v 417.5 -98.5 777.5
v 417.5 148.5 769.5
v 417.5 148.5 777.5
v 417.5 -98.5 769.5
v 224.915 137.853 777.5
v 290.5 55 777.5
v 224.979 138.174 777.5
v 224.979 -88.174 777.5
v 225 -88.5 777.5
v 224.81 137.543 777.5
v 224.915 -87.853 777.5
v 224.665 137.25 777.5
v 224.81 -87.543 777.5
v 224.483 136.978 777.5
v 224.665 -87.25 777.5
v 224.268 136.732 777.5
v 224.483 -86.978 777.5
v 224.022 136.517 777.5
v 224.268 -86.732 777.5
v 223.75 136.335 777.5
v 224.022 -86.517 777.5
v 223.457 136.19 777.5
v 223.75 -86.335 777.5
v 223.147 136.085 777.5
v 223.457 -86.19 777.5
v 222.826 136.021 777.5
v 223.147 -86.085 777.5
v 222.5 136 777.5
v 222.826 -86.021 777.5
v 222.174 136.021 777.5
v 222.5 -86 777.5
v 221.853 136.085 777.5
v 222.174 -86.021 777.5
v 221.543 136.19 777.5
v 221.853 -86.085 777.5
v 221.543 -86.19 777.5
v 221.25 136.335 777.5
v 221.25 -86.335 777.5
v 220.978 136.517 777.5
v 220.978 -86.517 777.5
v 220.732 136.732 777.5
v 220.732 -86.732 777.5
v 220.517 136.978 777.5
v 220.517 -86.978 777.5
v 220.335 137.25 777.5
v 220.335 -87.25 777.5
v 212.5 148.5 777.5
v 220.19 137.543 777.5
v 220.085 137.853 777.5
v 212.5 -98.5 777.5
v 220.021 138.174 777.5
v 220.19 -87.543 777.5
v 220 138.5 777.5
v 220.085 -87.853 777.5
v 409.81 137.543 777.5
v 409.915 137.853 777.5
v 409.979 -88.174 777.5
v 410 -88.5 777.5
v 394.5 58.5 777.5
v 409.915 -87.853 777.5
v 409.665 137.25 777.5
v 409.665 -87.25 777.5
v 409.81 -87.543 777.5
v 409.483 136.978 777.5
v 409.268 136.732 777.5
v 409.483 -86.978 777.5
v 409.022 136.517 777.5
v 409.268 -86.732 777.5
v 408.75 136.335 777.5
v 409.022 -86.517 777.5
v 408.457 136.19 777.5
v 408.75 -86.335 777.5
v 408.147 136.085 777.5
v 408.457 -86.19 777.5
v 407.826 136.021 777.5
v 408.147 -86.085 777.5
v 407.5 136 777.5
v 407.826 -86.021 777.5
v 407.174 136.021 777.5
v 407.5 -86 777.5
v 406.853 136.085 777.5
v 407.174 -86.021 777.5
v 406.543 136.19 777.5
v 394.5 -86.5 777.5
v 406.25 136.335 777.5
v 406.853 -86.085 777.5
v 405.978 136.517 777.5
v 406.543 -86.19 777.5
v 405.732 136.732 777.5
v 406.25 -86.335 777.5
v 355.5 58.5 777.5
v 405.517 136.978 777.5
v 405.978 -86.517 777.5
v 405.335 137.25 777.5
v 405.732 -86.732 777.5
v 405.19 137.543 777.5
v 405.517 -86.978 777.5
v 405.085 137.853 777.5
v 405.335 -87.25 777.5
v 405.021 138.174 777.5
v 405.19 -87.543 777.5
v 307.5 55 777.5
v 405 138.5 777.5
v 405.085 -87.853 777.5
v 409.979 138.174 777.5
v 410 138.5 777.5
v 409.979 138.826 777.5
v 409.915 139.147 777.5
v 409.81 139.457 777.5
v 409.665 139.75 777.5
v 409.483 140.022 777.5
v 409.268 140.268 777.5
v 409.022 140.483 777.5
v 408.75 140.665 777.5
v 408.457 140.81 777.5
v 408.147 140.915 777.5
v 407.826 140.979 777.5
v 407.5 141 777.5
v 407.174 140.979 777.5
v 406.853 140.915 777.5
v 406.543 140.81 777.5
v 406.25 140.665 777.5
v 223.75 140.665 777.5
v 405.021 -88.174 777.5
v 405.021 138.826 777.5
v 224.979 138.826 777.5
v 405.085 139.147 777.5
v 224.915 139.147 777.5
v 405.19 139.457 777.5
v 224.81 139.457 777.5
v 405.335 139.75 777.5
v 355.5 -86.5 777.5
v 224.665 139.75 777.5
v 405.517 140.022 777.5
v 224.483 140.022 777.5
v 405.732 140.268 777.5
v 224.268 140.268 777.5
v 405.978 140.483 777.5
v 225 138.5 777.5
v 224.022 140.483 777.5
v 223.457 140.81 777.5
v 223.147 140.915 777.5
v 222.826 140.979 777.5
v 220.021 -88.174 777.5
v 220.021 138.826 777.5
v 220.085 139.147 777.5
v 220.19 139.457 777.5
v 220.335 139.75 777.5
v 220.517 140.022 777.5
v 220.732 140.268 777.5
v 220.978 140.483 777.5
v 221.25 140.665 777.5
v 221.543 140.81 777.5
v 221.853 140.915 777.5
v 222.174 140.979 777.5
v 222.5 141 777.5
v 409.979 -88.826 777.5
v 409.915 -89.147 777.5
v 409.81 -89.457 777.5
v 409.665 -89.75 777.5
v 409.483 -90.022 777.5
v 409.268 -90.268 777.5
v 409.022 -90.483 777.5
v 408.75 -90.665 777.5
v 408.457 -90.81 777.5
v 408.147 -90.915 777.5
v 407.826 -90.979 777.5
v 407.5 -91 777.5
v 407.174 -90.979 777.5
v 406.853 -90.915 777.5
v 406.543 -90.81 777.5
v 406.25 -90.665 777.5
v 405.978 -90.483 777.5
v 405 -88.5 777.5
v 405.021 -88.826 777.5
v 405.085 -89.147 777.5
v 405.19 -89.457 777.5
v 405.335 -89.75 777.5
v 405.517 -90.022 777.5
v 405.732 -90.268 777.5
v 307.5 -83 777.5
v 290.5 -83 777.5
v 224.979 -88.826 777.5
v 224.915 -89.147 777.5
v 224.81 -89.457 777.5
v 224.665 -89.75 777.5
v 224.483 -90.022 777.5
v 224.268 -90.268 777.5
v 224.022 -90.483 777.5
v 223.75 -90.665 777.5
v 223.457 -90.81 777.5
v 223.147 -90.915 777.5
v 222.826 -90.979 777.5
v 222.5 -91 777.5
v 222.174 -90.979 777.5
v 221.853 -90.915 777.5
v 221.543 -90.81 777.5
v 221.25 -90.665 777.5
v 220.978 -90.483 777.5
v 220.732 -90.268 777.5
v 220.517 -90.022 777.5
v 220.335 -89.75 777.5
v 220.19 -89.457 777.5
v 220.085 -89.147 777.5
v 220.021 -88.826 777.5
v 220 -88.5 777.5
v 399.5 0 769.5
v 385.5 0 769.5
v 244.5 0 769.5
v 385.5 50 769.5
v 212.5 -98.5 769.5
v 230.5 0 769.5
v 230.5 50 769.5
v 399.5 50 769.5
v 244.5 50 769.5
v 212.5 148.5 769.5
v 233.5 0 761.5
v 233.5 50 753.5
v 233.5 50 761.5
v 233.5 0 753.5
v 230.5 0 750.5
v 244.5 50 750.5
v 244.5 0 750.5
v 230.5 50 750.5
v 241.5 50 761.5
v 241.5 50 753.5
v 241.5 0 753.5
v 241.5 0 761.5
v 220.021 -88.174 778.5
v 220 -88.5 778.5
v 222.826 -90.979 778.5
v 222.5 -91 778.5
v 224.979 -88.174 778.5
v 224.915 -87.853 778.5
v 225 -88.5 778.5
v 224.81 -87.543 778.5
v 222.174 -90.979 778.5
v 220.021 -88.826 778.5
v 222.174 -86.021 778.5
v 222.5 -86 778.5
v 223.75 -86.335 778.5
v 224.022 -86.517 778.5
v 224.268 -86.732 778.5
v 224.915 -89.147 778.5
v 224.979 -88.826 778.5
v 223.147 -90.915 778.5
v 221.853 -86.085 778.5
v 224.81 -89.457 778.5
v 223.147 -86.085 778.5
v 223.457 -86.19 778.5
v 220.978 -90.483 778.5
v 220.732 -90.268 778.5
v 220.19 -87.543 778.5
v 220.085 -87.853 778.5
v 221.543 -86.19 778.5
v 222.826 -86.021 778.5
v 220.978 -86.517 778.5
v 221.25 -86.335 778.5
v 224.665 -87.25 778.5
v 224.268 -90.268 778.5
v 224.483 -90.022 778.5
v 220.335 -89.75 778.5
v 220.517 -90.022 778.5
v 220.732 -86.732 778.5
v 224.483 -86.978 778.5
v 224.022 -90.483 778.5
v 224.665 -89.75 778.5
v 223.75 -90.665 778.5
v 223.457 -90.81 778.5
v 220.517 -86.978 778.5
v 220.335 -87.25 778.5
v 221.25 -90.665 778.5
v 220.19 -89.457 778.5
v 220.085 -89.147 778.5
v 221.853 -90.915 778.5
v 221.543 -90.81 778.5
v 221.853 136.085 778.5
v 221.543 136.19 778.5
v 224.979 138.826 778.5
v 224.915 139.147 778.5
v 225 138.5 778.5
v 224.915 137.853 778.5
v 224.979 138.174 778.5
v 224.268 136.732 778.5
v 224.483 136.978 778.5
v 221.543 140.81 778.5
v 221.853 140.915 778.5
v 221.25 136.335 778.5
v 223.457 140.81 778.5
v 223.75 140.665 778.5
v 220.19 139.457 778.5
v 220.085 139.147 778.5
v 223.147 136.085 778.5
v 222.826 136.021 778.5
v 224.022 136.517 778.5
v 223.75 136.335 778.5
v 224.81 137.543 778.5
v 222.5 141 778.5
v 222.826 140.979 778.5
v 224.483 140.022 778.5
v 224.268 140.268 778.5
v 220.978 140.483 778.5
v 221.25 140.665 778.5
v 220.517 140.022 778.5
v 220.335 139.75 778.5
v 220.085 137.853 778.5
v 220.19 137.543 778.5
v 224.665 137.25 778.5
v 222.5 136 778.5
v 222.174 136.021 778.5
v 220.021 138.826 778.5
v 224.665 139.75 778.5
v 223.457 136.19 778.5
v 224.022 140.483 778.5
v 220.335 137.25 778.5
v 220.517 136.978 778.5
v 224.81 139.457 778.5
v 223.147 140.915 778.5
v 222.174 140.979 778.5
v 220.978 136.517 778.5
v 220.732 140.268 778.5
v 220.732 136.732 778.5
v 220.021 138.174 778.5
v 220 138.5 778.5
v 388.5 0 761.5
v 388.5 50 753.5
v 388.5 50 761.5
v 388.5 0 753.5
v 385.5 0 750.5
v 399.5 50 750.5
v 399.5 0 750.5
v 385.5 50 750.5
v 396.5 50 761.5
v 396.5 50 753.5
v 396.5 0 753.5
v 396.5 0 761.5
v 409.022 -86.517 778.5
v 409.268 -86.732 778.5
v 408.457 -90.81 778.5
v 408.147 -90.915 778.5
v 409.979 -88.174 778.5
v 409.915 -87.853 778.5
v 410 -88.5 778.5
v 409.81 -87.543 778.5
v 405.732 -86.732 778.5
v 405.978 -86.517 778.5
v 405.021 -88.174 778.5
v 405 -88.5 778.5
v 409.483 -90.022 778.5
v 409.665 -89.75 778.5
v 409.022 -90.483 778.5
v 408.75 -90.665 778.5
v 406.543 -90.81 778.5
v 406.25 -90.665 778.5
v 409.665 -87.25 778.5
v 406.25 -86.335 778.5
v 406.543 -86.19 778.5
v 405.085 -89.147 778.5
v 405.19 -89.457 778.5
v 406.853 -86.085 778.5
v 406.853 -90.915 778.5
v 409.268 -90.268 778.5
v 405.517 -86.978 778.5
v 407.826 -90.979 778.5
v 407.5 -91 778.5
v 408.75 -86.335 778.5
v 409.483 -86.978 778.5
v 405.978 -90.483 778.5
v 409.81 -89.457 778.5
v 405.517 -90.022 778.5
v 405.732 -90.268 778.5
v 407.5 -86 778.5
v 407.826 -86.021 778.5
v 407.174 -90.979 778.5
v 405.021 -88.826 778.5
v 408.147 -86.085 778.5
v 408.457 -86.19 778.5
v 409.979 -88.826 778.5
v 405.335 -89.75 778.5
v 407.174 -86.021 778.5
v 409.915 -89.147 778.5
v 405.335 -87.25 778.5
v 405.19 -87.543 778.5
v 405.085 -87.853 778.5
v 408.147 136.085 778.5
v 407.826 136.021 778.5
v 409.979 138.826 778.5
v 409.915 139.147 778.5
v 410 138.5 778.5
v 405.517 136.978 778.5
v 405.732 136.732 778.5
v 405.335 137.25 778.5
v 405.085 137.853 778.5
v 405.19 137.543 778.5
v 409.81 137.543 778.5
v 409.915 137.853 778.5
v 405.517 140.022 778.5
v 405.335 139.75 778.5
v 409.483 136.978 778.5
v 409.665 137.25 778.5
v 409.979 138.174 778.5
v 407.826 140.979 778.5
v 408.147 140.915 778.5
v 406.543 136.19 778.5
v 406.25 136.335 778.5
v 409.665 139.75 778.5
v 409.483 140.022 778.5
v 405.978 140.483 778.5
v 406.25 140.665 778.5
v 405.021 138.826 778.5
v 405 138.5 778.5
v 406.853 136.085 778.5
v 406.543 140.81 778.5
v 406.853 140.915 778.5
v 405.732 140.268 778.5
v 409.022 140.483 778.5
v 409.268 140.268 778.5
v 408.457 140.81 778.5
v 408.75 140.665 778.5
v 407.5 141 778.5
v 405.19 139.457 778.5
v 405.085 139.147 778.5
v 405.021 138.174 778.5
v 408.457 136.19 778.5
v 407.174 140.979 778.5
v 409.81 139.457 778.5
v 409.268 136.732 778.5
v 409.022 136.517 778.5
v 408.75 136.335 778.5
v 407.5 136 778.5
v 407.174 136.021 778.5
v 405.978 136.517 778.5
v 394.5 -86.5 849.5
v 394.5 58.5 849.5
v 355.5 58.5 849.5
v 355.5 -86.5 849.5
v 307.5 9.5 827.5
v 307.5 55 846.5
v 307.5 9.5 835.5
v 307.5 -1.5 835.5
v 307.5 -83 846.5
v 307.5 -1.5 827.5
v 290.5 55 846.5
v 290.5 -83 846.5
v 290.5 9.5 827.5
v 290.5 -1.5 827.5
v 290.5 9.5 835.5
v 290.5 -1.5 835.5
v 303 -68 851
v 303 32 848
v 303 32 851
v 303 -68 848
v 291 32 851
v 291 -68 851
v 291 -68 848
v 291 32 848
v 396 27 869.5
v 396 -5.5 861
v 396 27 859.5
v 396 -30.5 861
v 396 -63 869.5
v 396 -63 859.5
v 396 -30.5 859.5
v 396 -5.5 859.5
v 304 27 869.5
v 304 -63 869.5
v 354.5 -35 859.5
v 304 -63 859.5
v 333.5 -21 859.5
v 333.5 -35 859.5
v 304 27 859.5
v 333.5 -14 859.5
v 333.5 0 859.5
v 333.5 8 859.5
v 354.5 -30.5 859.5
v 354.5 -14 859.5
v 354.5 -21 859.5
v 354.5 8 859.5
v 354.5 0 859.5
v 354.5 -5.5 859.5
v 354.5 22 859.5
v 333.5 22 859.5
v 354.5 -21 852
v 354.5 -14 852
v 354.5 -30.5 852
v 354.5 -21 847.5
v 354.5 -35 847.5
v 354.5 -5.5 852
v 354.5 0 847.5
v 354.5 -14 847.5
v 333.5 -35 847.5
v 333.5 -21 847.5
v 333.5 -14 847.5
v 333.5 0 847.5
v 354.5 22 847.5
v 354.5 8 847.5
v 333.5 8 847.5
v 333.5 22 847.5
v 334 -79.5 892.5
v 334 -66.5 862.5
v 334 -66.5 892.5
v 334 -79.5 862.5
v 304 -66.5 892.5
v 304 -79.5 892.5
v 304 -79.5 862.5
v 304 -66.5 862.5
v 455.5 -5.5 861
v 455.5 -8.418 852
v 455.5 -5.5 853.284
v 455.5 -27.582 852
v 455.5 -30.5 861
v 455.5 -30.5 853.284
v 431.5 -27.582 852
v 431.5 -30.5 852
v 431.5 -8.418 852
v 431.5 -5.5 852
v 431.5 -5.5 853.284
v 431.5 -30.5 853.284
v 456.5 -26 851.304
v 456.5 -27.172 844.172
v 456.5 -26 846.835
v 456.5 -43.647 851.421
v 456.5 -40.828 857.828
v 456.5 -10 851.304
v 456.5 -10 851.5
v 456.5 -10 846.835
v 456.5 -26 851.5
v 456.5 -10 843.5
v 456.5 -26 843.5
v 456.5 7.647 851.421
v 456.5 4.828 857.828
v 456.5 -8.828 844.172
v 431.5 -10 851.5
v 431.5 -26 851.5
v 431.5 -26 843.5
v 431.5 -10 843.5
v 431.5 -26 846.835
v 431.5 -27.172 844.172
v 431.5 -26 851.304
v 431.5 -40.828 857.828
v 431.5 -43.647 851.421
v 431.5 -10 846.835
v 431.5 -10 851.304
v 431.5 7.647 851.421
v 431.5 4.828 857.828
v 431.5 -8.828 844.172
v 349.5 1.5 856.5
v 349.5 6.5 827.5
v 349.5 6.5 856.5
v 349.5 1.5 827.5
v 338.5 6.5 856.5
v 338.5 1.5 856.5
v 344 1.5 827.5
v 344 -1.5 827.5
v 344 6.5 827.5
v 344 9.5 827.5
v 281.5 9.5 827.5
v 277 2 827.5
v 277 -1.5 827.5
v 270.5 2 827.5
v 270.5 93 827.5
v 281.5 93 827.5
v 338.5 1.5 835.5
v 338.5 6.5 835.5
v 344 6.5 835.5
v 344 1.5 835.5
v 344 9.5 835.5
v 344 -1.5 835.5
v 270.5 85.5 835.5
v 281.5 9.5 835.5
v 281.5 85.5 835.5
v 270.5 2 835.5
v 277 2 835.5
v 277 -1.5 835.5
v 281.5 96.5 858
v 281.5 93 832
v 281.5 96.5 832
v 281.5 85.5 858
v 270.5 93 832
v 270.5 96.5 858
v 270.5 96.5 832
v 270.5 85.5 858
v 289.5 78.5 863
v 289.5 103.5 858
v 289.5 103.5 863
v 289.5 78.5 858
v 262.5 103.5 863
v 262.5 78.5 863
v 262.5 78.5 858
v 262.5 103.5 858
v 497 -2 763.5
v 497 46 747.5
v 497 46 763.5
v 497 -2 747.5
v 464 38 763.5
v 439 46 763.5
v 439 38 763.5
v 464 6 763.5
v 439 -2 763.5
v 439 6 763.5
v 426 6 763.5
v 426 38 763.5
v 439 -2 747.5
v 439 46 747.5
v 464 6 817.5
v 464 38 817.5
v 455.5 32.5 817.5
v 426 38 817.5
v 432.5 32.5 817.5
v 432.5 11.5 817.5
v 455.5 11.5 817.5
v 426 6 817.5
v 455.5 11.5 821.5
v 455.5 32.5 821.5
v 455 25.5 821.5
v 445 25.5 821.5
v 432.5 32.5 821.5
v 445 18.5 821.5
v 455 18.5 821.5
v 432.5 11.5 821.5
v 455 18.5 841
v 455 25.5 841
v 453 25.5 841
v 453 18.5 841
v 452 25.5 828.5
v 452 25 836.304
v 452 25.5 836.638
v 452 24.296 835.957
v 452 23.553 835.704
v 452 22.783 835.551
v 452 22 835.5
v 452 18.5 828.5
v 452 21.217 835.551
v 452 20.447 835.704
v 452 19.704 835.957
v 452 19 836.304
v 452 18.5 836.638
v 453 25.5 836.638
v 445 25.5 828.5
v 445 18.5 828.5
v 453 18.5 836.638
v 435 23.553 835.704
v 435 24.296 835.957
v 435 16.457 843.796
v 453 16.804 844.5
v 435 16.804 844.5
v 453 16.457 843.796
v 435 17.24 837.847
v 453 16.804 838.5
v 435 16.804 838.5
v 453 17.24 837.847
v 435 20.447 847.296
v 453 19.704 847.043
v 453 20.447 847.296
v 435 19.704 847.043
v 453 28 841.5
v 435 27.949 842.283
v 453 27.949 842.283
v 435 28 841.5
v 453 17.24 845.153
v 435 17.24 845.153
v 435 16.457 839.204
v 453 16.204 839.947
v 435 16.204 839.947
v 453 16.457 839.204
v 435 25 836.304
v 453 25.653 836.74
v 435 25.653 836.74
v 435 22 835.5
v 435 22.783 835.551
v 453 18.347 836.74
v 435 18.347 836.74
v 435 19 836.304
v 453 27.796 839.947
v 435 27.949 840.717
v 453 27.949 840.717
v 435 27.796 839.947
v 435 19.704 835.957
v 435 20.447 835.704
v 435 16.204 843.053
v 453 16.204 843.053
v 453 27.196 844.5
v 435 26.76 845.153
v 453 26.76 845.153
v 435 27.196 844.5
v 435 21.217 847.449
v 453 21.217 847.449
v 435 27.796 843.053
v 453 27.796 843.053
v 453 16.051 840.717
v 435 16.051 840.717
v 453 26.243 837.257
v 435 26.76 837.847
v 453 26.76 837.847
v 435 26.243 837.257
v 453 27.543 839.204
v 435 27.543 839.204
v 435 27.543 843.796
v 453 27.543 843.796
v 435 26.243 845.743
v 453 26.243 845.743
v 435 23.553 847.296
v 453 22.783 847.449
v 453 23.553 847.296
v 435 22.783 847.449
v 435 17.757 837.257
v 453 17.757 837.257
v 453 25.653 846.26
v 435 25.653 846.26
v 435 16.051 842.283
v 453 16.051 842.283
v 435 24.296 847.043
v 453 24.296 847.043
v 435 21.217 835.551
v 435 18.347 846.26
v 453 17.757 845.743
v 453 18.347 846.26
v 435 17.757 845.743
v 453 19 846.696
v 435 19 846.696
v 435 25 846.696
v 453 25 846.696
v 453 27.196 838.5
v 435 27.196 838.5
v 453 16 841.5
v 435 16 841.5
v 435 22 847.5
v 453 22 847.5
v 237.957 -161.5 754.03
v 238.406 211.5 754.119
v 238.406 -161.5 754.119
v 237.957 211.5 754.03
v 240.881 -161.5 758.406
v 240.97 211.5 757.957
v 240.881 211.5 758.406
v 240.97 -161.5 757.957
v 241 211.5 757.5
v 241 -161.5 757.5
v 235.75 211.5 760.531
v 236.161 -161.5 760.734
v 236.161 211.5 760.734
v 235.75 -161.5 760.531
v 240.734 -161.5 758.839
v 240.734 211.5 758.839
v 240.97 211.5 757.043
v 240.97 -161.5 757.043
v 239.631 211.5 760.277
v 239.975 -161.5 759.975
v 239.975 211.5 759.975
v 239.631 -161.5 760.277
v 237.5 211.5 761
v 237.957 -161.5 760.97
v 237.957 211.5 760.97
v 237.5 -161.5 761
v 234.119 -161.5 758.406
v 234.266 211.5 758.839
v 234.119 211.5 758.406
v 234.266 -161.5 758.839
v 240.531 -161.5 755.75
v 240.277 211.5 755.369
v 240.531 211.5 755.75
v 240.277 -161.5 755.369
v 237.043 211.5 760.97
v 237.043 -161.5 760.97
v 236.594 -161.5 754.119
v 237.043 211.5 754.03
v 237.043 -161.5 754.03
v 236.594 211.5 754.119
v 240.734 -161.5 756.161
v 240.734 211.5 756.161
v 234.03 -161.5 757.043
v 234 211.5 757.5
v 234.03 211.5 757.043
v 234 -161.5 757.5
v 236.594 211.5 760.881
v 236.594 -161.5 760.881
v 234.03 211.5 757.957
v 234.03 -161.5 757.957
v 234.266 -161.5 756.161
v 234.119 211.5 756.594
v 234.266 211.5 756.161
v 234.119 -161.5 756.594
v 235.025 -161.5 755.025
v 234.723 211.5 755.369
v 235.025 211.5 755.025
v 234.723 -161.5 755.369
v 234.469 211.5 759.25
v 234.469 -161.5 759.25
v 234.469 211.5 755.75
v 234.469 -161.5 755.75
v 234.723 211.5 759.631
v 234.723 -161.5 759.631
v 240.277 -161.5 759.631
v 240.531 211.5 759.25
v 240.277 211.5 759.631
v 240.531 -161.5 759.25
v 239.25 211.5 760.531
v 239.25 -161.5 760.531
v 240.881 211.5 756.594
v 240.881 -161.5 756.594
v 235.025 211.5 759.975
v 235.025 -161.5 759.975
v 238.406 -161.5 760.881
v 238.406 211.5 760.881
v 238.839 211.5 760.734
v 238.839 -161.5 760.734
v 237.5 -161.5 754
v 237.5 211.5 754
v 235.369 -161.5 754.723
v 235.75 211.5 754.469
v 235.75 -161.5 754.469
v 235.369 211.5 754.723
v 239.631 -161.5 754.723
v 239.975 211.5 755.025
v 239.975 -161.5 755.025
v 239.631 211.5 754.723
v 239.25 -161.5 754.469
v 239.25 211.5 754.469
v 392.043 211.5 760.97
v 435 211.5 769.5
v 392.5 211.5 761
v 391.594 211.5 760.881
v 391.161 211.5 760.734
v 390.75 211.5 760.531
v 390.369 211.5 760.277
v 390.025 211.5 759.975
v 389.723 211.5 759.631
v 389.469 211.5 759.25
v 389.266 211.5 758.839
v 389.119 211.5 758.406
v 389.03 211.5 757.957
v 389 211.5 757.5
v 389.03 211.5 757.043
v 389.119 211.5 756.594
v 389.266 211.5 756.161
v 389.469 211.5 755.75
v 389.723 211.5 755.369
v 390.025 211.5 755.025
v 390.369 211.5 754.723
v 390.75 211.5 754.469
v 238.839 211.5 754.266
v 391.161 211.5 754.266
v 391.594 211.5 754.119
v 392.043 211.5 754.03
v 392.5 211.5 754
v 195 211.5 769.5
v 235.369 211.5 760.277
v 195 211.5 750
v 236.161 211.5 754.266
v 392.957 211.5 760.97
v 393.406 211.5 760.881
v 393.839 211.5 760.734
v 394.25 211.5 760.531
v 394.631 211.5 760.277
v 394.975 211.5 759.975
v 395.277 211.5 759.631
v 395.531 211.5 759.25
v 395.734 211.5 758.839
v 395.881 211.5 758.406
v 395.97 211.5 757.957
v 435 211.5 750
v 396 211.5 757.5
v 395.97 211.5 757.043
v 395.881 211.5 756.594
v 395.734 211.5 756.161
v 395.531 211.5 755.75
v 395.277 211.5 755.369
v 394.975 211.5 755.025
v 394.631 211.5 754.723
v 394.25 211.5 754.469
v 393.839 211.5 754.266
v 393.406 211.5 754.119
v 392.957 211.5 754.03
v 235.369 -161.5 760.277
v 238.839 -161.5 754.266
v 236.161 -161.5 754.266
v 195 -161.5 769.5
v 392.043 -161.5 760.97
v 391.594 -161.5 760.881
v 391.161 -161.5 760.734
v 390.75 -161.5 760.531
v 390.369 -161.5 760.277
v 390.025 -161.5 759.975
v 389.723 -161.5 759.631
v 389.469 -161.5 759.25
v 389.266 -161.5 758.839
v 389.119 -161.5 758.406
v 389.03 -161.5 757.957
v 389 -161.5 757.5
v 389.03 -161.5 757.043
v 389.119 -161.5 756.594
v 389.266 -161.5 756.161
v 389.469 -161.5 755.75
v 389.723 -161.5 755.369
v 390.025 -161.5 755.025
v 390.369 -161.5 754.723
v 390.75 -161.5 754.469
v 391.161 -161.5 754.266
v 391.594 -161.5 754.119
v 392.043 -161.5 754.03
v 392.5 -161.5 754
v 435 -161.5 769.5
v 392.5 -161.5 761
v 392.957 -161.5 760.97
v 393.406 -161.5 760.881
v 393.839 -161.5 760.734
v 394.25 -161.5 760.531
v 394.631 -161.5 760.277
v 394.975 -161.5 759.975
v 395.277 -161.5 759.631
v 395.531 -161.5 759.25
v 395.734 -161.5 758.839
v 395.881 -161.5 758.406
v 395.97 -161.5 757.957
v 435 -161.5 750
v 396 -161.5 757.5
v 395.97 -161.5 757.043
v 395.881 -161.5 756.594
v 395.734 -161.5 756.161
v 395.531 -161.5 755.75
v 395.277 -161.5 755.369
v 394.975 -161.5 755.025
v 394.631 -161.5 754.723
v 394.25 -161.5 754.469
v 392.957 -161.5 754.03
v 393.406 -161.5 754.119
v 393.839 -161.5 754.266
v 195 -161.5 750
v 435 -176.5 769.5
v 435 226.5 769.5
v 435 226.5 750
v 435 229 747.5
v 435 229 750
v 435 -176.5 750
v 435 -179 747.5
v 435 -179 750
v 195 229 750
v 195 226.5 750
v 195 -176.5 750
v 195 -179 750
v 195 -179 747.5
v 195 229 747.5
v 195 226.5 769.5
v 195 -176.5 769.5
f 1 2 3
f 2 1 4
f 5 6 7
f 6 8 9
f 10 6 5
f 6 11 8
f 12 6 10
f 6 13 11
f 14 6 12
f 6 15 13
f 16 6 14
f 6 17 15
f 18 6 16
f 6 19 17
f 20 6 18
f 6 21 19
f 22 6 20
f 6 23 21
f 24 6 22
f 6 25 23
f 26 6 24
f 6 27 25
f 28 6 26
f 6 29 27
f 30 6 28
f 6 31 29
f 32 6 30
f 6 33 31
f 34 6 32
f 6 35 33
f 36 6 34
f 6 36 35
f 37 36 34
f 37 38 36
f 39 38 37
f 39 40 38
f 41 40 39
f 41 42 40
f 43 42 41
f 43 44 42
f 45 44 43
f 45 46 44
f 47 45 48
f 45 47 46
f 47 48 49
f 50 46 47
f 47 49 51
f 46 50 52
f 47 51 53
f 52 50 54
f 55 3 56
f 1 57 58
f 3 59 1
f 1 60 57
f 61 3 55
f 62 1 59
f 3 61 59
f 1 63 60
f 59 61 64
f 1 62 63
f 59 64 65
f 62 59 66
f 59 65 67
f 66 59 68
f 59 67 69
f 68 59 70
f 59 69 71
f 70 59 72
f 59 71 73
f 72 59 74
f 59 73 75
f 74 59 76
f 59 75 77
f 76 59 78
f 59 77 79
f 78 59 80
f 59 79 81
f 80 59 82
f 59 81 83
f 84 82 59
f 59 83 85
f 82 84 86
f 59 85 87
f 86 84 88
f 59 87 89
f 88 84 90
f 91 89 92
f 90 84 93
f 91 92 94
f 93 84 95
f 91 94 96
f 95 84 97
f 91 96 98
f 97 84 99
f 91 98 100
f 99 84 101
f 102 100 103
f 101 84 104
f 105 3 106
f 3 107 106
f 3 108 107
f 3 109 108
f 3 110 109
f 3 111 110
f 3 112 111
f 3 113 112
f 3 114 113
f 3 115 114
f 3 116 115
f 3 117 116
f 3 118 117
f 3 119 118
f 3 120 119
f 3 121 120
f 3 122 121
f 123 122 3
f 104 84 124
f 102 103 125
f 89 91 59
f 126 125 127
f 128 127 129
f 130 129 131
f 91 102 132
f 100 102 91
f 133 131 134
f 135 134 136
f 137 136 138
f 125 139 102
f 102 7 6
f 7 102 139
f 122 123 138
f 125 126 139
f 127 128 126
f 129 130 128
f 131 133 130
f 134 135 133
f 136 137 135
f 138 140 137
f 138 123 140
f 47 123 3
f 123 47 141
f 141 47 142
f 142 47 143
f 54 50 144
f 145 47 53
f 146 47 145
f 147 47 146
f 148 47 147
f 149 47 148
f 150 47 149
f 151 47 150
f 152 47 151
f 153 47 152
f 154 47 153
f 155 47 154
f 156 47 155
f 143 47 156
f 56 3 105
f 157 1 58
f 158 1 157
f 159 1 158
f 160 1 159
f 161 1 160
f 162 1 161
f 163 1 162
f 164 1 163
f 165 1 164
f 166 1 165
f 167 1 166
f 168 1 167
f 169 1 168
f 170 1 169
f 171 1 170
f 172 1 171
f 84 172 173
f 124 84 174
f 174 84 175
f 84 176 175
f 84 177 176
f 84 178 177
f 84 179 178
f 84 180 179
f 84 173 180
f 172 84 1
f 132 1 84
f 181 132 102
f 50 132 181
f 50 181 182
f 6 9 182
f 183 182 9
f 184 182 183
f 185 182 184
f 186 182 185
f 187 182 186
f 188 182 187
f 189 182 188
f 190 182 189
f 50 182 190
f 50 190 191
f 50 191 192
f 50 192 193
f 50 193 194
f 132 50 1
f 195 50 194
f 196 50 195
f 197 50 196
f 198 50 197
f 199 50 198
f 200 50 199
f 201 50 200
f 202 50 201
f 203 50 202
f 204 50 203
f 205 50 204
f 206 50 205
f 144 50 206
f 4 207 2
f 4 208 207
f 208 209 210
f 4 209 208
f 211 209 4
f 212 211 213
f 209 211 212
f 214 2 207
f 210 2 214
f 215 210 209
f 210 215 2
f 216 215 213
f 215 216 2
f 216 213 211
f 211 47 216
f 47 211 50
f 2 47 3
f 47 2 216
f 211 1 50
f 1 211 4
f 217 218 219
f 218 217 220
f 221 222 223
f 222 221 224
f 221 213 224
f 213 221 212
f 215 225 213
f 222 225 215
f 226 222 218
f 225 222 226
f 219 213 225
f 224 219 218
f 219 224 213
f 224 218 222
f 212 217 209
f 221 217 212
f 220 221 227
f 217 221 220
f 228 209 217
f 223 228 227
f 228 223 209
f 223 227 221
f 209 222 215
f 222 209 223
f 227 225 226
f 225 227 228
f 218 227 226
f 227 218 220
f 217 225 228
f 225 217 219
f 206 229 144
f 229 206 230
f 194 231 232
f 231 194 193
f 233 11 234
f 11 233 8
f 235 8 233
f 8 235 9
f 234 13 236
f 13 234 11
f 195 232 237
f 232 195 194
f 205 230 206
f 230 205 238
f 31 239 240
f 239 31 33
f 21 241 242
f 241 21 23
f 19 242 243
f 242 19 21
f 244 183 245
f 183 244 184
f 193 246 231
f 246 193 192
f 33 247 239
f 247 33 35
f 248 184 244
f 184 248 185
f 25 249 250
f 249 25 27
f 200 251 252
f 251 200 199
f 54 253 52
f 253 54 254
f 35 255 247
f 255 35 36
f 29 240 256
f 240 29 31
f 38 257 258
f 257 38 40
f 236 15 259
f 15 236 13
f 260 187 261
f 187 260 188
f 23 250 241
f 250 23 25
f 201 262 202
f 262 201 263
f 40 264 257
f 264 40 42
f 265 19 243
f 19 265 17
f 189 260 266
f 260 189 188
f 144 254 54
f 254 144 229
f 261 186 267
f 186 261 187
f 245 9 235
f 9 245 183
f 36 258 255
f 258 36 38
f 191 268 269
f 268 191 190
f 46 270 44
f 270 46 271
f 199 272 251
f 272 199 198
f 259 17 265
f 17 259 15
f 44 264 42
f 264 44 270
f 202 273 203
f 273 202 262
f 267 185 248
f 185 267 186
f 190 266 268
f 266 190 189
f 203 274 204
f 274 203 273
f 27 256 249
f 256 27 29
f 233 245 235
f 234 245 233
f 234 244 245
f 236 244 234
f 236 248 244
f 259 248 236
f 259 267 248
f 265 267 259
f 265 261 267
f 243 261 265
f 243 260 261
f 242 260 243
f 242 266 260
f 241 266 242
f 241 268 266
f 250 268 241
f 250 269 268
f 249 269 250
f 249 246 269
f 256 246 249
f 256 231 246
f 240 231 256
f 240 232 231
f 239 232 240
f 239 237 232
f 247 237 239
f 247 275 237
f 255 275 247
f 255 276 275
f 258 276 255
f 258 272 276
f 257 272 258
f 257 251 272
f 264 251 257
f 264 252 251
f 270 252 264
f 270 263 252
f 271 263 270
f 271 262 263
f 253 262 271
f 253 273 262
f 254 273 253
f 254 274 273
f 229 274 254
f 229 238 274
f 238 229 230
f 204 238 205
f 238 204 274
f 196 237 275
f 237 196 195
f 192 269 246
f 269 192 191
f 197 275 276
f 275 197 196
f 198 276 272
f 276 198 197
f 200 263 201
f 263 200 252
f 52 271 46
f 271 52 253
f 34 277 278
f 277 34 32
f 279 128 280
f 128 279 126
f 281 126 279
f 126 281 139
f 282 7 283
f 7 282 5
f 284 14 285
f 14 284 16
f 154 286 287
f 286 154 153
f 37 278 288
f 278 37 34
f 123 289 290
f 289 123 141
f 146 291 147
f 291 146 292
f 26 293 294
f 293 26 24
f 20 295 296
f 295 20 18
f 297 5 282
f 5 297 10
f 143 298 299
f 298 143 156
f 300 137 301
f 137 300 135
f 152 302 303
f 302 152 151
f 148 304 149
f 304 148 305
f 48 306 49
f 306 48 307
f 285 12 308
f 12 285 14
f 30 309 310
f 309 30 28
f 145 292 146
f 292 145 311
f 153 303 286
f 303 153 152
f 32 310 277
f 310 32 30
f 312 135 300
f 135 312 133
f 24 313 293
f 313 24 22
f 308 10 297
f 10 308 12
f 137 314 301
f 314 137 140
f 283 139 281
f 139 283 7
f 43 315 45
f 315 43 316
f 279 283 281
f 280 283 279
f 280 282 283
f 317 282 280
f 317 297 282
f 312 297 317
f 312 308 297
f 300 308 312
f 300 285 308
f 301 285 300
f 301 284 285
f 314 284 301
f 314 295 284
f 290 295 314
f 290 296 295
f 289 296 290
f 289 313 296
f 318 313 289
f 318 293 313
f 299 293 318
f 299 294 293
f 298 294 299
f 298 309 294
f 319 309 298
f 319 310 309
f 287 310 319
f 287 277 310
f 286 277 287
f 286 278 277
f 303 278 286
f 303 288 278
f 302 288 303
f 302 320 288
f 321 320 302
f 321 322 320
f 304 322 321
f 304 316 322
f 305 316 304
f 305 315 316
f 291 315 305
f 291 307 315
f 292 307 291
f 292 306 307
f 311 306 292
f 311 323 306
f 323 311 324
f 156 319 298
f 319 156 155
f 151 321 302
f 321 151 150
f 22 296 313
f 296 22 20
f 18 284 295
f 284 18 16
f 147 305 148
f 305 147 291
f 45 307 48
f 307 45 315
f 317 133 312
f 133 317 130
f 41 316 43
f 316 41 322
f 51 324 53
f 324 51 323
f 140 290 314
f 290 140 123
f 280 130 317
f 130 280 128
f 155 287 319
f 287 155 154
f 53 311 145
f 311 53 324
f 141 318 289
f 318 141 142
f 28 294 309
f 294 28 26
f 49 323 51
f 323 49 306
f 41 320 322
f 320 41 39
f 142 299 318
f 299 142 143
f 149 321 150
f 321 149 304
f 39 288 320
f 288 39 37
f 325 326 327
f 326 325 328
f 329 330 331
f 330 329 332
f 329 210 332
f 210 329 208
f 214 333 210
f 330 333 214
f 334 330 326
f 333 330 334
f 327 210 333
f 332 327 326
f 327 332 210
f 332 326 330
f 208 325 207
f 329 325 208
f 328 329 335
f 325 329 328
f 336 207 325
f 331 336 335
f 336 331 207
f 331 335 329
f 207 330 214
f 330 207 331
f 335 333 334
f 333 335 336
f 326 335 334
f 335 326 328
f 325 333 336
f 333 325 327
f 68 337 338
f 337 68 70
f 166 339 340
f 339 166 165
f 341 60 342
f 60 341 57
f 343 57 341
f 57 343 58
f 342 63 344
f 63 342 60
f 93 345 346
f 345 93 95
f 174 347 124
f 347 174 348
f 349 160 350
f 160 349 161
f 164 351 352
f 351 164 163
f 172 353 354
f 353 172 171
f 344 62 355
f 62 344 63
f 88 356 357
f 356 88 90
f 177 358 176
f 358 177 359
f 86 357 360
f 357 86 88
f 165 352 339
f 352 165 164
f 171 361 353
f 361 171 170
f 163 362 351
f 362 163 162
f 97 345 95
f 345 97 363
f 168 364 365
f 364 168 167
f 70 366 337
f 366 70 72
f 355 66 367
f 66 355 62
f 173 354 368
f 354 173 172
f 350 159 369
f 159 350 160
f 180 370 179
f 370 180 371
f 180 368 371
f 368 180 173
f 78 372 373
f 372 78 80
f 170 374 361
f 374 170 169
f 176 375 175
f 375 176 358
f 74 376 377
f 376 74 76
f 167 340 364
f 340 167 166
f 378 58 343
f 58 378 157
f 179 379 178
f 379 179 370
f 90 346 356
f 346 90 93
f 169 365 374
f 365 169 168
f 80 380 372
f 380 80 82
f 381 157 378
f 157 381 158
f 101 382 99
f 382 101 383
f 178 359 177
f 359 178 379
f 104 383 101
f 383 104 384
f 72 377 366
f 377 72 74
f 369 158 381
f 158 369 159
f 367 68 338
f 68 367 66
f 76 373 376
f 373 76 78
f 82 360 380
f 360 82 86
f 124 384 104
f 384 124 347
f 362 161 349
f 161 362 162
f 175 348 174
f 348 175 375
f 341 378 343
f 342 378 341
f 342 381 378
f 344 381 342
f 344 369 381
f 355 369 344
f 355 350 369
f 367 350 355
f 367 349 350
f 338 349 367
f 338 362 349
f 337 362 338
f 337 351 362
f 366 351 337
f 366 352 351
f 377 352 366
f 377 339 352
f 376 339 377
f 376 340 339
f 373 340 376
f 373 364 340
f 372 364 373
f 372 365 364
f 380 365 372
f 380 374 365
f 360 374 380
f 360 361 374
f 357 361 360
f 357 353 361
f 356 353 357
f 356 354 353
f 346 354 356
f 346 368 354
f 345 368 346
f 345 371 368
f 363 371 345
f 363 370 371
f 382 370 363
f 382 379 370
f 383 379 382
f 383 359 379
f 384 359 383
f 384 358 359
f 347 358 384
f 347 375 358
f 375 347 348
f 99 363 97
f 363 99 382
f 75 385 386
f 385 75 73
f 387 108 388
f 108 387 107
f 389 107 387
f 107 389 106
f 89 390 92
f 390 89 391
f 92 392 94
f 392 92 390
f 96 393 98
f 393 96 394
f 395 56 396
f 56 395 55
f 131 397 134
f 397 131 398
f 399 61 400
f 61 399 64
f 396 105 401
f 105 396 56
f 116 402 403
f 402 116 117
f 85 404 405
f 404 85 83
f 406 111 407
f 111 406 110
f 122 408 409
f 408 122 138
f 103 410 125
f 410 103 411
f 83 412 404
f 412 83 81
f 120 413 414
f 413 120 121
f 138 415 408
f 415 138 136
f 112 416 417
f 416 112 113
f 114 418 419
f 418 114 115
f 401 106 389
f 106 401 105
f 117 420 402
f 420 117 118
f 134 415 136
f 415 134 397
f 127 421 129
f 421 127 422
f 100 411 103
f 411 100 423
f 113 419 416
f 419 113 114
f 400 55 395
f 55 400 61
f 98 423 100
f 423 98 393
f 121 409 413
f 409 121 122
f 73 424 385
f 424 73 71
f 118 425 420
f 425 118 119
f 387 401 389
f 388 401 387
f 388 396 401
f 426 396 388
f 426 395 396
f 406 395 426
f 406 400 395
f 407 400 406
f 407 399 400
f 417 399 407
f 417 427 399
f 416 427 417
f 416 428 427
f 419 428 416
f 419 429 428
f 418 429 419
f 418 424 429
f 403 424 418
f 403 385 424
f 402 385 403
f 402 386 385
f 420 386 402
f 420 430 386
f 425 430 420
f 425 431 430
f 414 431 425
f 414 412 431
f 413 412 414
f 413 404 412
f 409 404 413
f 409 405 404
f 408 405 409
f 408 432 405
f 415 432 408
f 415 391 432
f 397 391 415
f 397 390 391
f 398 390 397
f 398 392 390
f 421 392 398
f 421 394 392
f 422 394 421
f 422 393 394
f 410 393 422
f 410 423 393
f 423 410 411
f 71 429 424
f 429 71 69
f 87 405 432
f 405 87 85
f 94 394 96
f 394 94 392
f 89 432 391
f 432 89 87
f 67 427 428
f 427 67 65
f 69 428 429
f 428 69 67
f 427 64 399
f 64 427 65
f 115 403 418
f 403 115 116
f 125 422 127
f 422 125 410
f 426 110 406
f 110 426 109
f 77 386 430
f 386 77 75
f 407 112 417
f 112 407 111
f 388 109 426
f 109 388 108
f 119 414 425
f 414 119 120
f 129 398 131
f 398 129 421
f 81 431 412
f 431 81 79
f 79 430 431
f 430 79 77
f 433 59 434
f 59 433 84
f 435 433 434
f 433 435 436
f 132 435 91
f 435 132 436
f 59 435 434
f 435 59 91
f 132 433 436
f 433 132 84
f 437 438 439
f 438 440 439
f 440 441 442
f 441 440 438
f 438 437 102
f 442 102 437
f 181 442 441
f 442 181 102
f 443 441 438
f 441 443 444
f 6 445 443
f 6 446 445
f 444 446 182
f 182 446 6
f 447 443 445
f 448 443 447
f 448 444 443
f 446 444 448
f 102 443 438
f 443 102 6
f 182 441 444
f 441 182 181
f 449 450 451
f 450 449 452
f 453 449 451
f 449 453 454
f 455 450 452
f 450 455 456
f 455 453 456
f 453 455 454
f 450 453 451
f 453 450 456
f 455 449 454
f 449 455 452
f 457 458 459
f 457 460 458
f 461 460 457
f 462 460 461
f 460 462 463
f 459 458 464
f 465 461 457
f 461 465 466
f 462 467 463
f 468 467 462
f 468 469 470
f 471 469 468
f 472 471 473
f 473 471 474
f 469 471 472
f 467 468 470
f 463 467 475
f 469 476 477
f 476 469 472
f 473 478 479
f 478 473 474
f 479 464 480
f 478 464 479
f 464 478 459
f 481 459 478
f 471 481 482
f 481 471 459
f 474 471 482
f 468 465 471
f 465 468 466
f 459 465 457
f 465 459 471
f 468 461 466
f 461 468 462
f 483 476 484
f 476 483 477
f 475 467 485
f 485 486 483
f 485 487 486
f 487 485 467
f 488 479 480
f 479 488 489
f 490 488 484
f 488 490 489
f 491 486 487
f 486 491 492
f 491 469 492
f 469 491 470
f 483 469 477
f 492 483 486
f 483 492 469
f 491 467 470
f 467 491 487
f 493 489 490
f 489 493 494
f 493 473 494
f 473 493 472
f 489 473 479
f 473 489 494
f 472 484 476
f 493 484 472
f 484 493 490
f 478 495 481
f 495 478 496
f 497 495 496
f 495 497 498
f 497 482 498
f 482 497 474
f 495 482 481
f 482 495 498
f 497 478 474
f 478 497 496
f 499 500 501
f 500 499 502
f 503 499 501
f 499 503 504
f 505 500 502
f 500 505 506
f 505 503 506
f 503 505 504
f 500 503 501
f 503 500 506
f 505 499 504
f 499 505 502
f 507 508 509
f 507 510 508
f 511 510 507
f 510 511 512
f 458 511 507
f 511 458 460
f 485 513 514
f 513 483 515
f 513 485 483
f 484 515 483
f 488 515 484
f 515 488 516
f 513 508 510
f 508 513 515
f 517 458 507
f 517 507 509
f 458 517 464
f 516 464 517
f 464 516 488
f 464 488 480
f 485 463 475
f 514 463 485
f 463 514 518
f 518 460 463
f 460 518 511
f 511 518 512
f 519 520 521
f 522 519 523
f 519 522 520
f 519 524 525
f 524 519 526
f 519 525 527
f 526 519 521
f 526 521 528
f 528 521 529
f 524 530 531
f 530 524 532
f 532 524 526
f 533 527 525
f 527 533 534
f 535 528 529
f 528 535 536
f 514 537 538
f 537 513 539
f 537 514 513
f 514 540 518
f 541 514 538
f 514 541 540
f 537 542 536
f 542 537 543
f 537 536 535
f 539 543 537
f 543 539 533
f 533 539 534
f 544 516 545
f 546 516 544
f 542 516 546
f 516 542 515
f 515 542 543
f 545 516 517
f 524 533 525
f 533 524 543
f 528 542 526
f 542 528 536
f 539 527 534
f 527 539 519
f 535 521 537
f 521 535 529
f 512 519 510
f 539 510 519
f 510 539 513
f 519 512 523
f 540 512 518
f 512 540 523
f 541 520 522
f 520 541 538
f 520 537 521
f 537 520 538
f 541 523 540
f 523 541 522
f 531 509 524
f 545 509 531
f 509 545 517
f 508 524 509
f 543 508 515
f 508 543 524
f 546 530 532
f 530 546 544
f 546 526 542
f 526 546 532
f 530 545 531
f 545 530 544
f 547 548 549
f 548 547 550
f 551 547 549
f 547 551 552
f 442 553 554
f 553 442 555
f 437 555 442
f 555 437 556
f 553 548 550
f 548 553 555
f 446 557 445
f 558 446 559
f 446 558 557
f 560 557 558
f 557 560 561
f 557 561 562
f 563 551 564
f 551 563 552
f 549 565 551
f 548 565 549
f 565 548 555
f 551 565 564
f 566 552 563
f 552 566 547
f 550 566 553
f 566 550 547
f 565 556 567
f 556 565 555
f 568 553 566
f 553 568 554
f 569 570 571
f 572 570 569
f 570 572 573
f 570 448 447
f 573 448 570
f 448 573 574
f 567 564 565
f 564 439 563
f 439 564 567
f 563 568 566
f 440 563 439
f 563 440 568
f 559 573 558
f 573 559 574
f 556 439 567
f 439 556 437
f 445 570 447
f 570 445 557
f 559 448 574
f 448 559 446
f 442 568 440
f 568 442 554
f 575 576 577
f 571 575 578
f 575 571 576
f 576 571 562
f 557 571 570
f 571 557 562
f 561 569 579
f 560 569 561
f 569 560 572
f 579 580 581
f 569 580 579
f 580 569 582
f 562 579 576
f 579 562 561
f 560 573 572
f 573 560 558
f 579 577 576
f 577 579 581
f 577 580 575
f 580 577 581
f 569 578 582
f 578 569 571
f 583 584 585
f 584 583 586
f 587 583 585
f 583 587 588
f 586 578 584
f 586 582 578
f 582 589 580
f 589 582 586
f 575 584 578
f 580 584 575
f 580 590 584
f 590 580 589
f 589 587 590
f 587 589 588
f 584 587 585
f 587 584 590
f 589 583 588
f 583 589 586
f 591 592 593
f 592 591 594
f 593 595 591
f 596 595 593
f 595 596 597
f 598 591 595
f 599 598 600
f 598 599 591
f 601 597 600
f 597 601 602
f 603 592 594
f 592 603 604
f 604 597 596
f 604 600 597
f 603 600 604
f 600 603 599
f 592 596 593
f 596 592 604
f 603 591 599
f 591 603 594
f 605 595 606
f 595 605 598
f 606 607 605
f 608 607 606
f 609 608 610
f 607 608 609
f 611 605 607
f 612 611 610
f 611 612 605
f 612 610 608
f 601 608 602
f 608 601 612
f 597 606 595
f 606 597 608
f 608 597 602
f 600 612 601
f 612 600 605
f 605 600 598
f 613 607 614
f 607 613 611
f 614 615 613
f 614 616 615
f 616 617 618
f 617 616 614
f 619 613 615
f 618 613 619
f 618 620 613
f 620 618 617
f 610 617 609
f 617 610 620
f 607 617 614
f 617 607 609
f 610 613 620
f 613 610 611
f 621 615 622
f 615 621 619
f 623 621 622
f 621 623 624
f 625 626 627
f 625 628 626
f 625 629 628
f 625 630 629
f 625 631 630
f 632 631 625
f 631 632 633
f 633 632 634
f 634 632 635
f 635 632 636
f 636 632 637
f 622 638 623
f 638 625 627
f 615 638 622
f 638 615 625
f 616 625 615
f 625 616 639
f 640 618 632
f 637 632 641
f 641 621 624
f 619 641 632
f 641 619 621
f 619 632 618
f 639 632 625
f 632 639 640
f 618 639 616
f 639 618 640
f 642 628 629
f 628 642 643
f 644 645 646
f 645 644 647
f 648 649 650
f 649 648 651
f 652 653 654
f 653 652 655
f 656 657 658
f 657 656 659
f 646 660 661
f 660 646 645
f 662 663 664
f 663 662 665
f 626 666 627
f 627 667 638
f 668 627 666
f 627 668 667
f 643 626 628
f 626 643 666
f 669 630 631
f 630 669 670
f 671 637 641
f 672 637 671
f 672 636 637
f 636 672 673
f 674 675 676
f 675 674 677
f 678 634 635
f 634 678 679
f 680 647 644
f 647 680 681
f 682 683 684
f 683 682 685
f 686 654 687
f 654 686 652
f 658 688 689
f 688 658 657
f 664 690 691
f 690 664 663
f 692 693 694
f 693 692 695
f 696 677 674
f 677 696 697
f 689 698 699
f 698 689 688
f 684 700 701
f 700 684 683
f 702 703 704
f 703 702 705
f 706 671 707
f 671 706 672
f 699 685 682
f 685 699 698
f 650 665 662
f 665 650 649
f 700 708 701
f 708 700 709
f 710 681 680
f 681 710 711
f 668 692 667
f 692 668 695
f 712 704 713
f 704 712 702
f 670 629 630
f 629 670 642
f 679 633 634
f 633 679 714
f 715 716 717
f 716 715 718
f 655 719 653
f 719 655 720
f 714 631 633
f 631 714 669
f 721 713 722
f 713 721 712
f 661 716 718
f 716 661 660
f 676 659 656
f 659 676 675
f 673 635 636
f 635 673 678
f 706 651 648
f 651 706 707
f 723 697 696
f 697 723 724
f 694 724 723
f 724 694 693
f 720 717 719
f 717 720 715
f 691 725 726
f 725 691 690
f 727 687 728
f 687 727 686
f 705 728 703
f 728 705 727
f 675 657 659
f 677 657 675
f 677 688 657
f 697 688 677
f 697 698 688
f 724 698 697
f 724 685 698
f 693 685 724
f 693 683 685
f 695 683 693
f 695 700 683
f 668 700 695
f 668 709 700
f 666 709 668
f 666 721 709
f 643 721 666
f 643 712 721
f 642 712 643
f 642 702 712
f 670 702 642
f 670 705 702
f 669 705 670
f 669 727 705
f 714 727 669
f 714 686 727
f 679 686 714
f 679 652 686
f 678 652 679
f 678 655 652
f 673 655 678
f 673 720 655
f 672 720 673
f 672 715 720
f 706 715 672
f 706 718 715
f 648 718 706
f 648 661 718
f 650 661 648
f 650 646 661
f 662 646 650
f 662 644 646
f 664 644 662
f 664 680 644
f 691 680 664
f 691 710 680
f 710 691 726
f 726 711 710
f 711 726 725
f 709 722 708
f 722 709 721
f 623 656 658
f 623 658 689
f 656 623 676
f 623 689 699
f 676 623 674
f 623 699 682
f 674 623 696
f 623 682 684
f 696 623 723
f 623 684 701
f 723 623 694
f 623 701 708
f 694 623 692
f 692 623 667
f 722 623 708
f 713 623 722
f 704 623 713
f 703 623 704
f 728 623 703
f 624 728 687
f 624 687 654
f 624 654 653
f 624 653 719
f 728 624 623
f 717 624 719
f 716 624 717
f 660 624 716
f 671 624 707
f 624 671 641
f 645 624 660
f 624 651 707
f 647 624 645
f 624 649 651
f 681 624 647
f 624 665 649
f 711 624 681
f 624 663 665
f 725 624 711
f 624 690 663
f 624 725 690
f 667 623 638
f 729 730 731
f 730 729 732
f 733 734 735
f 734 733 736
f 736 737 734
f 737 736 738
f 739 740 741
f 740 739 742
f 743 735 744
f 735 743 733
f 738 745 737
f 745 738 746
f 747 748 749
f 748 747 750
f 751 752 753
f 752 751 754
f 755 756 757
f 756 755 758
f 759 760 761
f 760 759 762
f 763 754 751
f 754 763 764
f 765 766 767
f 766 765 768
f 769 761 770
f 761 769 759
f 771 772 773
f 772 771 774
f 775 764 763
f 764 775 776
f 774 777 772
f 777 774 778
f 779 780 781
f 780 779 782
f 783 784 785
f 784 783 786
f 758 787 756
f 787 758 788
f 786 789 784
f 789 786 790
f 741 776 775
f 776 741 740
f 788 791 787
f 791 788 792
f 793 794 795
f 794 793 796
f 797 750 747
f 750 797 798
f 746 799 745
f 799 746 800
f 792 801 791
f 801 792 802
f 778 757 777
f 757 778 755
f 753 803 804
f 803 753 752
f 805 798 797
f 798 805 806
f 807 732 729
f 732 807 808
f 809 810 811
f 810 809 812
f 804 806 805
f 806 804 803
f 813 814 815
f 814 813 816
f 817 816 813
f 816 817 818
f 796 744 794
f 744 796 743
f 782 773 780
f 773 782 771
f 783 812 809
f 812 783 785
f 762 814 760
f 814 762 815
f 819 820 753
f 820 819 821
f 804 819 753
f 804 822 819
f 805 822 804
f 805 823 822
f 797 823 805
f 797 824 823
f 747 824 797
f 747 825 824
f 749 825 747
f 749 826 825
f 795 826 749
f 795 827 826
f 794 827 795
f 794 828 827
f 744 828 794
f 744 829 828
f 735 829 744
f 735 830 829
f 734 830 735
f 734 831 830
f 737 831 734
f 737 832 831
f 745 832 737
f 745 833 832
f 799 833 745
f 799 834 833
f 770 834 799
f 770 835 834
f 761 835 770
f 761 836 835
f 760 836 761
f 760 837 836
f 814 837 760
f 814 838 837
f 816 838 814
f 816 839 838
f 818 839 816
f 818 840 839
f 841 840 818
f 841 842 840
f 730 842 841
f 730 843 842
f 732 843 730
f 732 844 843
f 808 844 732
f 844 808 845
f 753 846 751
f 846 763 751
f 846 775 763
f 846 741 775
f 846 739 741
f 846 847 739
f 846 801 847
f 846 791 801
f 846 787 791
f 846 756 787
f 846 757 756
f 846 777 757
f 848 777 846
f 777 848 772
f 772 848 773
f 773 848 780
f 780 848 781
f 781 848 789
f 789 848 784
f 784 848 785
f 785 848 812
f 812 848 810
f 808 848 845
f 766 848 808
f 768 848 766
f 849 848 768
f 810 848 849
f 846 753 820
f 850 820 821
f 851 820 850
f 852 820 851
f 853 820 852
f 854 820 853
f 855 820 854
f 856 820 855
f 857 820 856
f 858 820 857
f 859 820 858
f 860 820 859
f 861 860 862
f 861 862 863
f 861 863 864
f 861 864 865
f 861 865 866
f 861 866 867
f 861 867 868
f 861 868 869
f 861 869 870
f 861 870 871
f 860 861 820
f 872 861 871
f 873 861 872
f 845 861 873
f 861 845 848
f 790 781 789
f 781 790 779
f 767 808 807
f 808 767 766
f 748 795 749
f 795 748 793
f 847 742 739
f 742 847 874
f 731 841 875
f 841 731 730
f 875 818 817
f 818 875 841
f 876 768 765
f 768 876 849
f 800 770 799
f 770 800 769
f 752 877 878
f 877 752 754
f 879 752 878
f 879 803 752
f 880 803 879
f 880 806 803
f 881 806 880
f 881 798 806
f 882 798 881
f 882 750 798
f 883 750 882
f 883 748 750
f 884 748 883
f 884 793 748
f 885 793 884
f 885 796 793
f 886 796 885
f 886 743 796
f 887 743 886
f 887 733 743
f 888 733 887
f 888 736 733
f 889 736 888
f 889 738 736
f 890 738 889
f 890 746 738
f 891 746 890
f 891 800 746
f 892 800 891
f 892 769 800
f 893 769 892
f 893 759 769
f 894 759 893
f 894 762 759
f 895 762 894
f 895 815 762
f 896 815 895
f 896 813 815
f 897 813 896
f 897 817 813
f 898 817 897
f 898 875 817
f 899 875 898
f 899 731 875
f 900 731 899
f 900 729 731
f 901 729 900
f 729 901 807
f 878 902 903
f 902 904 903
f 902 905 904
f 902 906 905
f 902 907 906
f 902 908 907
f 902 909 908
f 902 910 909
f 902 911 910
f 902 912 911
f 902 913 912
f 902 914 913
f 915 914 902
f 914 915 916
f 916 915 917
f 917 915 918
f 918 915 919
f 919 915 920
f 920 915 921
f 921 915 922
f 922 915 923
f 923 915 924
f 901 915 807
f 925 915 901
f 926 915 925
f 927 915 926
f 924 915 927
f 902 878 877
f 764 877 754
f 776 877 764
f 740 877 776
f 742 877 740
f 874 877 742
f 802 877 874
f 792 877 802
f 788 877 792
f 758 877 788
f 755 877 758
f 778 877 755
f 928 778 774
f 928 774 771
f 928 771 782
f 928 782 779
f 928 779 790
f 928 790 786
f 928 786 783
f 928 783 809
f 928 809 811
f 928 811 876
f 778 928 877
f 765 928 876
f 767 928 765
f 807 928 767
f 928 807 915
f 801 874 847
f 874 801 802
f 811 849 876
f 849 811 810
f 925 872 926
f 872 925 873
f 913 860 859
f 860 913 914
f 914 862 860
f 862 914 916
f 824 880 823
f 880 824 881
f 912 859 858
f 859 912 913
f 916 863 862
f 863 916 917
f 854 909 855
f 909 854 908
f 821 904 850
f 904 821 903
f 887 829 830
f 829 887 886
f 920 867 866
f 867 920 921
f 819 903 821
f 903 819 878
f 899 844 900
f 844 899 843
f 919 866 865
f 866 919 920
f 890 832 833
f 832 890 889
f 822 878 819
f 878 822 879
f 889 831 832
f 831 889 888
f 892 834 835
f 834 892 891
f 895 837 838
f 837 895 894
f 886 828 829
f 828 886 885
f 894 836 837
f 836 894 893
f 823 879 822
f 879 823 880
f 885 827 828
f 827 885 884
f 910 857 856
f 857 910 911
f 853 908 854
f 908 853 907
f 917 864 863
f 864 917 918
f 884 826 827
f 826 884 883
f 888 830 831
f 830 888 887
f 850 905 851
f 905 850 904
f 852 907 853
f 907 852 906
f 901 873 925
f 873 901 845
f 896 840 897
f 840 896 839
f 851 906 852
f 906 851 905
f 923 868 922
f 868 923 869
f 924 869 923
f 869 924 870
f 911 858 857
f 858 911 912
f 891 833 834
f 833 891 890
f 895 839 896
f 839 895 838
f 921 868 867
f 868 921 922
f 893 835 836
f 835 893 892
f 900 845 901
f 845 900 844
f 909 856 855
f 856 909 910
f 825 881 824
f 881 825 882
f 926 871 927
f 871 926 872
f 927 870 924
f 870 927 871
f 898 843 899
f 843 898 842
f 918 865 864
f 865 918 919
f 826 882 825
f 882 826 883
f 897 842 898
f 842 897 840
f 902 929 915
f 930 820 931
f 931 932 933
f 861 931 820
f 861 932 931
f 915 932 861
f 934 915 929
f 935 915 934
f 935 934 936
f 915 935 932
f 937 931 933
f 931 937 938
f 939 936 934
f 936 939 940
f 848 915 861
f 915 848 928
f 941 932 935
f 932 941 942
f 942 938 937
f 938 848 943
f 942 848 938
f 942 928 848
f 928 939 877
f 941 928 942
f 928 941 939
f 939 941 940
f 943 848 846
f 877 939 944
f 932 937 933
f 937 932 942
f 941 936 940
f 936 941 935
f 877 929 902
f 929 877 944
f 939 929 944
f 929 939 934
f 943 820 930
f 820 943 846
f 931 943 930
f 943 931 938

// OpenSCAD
// Millimetre geometric reference; use real functional tools, not printed heated or cutting equipment.
// Source SHA-256: 7838cb8b78dc14102535e830cea22ec27e1e11ca7ee88feacd9d7d66b1213c78
$fn=48;
module switch_test_carriage(){
translate([0, 0, 11]) rotate([0, 0, 0]) cube([205, 247, 8],center=true);
translate([-83, 0, -5]) rotate([0, 0, 0]) cube([3, 50, 14],center=true);
translate([-72, 0, -5]) rotate([0, 0, 0]) cube([3, 50, 14],center=true);
translate([-77.5, 0, -10.5]) rotate([0, 0, 0]) cube([8, 50, 3],center=true);
translate([-77.5, 0, 0.5]) rotate([0, 0, 0]) cube([8, 50, 3],center=true);
translate([-77.5, 0, 4.5]) rotate([0, 0, 0]) cube([14, 50, 6],center=true);
translate([-92.5, -113.5, 15.5]) rotate([0, 0, 0]) cylinder(r=2.5,h=1,center=true);
translate([-92.5, 113.5, 15.5]) rotate([0, 0, 0]) cylinder(r=2.5,h=1,center=true);
translate([72, 0, -5]) rotate([0, 0, 0]) cube([3, 50, 14],center=true);
translate([83, 0, -5]) rotate([0, 0, 0]) cube([3, 50, 14],center=true);
translate([77.5, 0, -10.5]) rotate([0, 0, 0]) cube([8, 50, 3],center=true);
translate([77.5, 0, 0.5]) rotate([0, 0, 0]) cube([8, 50, 3],center=true);
translate([77.5, 0, 4.5]) rotate([0, 0, 0]) cube([14, 50, 6],center=true);
translate([92.5, -113.5, 15.5]) rotate([0, 0, 0]) cylinder(r=2.5,h=1,center=true);
translate([92.5, 113.5, 15.5]) rotate([0, 0, 0]) cylinder(r=2.5,h=1,center=true);
translate([60, -39, 50.5]) rotate([0, 0, 0]) cube([39, 145, 73],center=true);
translate([-16, -39, 49]) rotate([0, 0, 0]) cube([17, 138, 70],center=true);
translate([-18, -43, 87]) rotate([0, 0, 0]) cube([12, 100, 3],center=true);
}
module indexed_cam_dog(){
translate([0, 0, 0]) rotate([0, 0, 0]) cube([92, 90, 10],center=true);
translate([-6, -10, -11]) rotate([0, 0, 0]) cube([21, 14, 12],center=true);
translate([-6, 11, -11]) rotate([0, 0, 0]) cube([21, 14, 12],center=true);
translate([-6, 33, -11]) rotate([0, 0, 0]) cube([21, 14, 12],center=true);
translate([-31, -55, 13]) rotate([0, 0, 0]) cube([30, 13, 30],center=true);
translate([55, 0, -8]) rotate([0, 0, 0]) cube([101, 25, 9],center=true);
translate([94, 0, -17]) rotate([0, 0, 0]) cube([25, 16, 8],center=true);
translate([94, -16, -13.5]) rotate([-23.7494944929, 0, 0]) cube([25, 18, 7],center=true);
translate([94, 16, -13.5]) rotate([23.7494944929, 0, 0]) cube([25, 18, 7],center=true);
}
module spring_index_pin(){
translate([0, 0, 2.5]) rotate([0, 0, 0]) cube([11, 5, 29],center=true);
translate([-33.5, 0, -8]) rotate([0, 0, 0]) cube([67, 11, 8],center=true);
translate([-68, 43.5, -8]) rotate([0, 0, 0]) cube([11, 91, 8],center=true);
translate([-68, 87, 7]) rotate([0, 0, 0]) cube([11, 11, 29],center=true);
translate([-68, 87, 21]) rotate([0, 0, 0]) cube([27, 25, 5],center=true);
}
module roller_switch_enclosure(){
translate([0, 0, -26]) rotate([0, 0, 0]) cube([58, 48, 16],center=true);
translate([-23, 0, 9]) rotate([0, 0, 0]) cube([38, 32, 54],center=true);
translate([-24, 0, 36]) rotate([0, 0, 0]) cube([23, 21, 8],center=true);
}
module switch_roller_plunger(){
translate([9.5, 0, -12]) rotate([0, 0, 0]) cube([3, 7, 23],center=true);
translate([5, 0, -21]) rotate([0, 0, 0]) cube([8, 7, 16],center=true);
}
module switch_roller_wheel(){
translate([0, 0, 0]) rotate([0, 0, 0]) rotate([0,90,0]) cylinder(r=6,h=18,center=true);
}
module switch_test_carriage_rail_left(){
translate([0, 0, 0]) rotate([0, 0, 0]) rotate([90,0,0]) cylinder(r=3.5,h=373,center=true);
}
module switch_test_carriage_rail_right(){
translate([0, 0, 0]) rotate([0, 0, 0]) rotate([90,0,0]) cylinder(r=3.5,h=373,center=true);
}
module switch_test_carriage_base(){
translate([0, 0, 0]) rotate([0, 0, 0]) cube([240, 408, 2.5],center=true);
}
module switch_test_carriage_end_front(){
translate([0, 0, 0]) rotate([0, 0, 0]) cube([240, 15, 22],center=true);
}
module switch_test_carriage_end_back(){
translate([0, 0, 0]) rotate([0, 0, 0]) cube([240, 15, 22],center=true);
}
translate([315, 25, 762.5]) rotate([0,0,0]) switch_test_carriage();
translate([350, -18, 864.5]) rotate([0,0,0]) indexed_cam_dog();
translate([344, 4, 839.5]) rotate([0,0,0]) spring_index_pin();
translate([468, 22, 781.5]) rotate([0,0,0]) roller_switch_enclosure();
translate([444, 22, 841.5]) rotate([0,0,0]) switch_roller_plunger();
translate([444, 22, 841.5]) rotate([0,0,0]) switch_roller_wheel();
translate([237.5, 25, 757.5]) rotate([0,0,0]) switch_test_carriage_rail_left();
translate([392.5, 25, 757.5]) rotate([0,0,0]) switch_test_carriage_rail_right();
translate([315, 25, 748.75]) rotate([0,0,0]) switch_test_carriage_base();
translate([315, -169, 758.5]) rotate([0,0,0]) switch_test_carriage_end_front();
translate([315, 219, 758.5]) rotate([0,0,0]) switch_test_carriage_end_back();
